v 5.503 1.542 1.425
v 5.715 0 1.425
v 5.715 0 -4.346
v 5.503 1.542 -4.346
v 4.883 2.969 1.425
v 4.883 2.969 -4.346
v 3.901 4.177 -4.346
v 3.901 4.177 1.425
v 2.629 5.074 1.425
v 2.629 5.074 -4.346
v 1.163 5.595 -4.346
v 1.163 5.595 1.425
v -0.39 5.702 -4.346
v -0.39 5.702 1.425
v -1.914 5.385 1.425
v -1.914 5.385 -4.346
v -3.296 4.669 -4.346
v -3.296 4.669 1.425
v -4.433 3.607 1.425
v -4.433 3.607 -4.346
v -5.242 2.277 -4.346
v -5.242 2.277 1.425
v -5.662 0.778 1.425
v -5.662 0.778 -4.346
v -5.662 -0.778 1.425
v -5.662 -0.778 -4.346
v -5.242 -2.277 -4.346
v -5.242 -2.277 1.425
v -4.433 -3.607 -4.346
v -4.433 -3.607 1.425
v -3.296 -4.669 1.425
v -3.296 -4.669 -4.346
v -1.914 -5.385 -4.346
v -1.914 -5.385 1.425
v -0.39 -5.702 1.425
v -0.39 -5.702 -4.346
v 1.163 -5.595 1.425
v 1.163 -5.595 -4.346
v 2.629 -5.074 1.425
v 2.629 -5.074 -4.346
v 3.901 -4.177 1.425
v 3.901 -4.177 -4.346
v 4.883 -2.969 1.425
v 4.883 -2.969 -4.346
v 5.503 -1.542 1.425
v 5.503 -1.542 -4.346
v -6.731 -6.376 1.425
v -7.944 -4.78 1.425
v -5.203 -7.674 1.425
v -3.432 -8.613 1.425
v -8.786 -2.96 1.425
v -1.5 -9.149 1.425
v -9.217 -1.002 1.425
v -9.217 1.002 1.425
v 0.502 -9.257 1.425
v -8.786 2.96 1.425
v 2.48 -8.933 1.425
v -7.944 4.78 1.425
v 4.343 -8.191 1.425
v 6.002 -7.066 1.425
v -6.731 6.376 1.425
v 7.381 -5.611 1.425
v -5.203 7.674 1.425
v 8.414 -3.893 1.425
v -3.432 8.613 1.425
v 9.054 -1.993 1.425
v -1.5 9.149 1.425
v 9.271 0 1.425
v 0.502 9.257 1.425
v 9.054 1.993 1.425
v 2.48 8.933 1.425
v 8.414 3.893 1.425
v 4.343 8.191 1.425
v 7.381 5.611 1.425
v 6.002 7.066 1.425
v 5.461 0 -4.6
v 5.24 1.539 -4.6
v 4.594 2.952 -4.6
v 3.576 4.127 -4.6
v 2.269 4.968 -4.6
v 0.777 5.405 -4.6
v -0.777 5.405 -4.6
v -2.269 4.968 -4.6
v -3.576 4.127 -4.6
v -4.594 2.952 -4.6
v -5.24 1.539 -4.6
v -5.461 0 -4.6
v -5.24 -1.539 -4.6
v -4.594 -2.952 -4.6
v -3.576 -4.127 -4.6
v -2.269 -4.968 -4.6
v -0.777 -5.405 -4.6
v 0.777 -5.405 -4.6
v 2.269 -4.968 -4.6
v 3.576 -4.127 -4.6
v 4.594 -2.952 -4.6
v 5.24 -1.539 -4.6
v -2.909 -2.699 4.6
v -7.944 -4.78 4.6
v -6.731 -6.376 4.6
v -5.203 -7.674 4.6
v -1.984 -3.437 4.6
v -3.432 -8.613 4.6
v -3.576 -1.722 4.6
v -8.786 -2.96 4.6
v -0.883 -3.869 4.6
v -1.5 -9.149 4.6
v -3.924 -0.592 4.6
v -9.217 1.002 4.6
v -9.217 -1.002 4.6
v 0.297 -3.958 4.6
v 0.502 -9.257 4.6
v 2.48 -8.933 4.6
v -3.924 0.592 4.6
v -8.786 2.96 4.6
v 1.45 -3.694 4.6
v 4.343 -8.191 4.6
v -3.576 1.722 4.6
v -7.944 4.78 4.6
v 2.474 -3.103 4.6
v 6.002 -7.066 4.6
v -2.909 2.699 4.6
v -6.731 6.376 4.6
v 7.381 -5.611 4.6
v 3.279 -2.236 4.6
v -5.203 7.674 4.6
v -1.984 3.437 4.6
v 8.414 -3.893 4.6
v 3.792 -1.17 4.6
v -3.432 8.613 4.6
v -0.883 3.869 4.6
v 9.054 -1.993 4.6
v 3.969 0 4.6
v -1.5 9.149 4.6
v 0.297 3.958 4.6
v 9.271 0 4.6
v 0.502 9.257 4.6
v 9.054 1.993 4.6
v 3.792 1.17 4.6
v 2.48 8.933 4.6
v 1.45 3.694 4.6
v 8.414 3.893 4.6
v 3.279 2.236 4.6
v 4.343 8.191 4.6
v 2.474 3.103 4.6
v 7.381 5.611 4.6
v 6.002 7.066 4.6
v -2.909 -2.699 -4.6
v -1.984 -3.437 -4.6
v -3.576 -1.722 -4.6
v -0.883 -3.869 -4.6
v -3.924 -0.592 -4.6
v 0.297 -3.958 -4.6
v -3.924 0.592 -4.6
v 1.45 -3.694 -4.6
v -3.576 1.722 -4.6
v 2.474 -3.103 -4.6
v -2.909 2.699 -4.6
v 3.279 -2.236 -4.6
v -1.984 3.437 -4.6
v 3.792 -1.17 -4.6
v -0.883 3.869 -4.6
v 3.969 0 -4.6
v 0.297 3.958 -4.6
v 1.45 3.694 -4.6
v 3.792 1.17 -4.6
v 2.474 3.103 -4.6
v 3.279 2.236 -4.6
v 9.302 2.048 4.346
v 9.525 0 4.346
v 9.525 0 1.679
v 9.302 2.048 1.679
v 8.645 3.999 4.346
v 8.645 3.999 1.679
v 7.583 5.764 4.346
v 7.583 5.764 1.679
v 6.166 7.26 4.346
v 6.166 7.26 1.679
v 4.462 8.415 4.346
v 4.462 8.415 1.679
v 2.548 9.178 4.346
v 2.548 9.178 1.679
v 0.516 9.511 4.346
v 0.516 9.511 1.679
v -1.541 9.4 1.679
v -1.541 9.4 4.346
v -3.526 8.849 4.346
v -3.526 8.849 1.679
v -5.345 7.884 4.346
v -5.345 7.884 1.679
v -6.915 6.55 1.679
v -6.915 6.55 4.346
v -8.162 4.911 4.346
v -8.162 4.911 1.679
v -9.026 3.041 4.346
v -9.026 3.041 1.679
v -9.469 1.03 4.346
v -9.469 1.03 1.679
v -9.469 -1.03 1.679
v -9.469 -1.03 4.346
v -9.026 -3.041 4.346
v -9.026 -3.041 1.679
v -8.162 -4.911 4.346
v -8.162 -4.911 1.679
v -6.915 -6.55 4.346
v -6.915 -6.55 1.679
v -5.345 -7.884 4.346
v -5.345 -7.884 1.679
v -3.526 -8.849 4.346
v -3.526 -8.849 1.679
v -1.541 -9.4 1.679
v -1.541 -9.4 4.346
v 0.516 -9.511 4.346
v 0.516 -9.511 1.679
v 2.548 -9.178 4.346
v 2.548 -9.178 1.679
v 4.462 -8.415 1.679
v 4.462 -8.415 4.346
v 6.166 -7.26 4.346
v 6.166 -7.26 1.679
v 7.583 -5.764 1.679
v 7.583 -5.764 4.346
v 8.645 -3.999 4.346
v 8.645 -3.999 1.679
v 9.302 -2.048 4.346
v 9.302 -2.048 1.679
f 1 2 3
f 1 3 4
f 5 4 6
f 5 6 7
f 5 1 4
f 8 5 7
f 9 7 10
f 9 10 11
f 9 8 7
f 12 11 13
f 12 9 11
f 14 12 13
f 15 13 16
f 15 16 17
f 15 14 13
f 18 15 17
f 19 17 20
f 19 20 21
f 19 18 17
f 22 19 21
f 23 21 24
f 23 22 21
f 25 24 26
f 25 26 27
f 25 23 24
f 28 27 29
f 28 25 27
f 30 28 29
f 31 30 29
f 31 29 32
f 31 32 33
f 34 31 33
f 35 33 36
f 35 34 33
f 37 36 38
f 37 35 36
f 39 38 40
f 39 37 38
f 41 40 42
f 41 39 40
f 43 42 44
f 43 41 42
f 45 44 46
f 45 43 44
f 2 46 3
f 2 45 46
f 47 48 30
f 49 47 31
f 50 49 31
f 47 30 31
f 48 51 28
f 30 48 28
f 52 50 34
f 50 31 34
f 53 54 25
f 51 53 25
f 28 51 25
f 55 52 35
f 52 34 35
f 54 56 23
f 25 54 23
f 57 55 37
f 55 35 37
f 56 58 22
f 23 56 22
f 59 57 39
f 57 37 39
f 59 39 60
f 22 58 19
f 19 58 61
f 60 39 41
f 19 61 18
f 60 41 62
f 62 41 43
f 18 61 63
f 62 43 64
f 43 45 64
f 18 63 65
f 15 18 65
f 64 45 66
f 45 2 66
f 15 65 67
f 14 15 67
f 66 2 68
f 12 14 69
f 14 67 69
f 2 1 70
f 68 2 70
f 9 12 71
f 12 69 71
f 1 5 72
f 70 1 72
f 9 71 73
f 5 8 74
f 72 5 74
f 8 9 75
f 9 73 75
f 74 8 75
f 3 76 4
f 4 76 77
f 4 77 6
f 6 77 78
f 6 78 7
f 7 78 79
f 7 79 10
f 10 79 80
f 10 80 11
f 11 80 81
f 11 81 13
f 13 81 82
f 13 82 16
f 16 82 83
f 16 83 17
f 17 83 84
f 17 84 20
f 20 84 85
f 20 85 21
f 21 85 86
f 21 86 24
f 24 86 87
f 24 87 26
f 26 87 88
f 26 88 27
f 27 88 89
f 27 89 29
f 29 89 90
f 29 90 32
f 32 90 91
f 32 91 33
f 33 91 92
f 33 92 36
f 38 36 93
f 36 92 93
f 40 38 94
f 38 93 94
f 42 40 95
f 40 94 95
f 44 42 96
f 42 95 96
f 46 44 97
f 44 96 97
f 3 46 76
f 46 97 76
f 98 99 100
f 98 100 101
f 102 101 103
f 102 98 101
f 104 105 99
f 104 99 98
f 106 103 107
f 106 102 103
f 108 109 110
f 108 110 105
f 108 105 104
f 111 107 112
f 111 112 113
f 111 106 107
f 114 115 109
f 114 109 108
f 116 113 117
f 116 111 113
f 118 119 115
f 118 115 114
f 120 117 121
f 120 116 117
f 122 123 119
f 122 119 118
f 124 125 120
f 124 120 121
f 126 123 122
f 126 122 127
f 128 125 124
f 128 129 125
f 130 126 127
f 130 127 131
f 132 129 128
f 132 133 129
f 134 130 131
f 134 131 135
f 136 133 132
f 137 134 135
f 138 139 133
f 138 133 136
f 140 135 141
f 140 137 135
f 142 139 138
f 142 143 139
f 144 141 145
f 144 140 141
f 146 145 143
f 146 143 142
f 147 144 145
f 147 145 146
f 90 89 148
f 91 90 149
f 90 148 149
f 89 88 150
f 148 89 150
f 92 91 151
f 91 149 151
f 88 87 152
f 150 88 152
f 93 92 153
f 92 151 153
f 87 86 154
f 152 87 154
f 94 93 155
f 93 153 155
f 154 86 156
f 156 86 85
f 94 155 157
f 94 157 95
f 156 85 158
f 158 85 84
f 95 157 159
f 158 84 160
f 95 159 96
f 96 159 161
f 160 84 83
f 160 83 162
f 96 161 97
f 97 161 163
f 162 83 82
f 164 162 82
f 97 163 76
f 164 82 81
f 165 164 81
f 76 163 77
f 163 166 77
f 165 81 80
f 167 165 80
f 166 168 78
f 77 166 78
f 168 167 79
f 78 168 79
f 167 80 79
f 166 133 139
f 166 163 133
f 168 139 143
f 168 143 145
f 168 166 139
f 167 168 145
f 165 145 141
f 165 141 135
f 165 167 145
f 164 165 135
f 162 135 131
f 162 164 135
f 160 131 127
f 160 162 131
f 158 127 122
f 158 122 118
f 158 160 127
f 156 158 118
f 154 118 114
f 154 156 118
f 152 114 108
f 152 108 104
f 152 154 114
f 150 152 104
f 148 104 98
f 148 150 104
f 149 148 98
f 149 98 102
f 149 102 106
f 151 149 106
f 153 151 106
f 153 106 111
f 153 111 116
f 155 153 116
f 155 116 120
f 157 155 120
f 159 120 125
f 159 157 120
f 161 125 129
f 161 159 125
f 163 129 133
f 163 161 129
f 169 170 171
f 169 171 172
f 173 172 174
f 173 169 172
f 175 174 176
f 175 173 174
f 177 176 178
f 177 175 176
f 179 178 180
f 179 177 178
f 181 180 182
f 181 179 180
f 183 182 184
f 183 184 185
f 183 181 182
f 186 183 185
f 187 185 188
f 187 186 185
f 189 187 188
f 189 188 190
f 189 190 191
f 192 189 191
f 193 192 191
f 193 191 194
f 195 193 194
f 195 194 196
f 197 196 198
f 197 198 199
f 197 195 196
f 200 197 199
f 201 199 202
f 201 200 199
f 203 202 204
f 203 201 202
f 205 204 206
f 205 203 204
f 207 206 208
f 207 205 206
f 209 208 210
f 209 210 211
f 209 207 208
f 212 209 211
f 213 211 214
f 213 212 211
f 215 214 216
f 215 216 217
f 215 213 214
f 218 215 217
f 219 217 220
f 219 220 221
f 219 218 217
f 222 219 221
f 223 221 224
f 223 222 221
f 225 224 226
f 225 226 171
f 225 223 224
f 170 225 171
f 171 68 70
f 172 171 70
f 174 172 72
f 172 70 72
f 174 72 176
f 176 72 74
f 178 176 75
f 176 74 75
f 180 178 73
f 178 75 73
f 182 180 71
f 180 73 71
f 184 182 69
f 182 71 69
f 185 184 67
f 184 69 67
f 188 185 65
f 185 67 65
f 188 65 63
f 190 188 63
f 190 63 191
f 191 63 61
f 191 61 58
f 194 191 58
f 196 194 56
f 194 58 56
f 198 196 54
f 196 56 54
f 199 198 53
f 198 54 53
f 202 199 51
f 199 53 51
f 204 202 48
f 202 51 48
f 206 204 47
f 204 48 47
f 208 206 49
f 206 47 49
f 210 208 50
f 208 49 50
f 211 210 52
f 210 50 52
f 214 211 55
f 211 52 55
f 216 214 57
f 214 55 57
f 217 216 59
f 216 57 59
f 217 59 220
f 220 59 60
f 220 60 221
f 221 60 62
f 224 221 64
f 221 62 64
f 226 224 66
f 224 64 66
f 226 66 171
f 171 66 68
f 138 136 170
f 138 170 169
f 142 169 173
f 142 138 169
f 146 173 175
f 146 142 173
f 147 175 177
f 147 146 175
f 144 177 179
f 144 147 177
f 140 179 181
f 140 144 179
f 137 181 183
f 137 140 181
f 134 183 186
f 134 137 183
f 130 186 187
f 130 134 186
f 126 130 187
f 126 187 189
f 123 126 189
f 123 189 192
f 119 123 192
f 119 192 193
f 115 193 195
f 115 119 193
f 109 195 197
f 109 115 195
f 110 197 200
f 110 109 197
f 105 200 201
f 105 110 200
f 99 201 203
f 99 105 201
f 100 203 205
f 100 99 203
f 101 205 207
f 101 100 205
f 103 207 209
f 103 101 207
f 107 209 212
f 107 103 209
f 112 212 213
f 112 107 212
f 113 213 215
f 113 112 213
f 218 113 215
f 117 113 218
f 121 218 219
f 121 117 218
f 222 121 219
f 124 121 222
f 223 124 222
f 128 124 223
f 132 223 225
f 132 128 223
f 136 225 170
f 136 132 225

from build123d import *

# Parameters (mm, degrees)
SKETCH1_R           = 5.715
SKETCH1_R_2         = 3.96875
BOSS_EXTRUDE1_DEPTH = 4.6
SKETCH2_R           = 9.525
SKETCH2_R_2         = 5.715
BOSS_EXTRUDE2_DEPTH = 3.175
CHAMFER2_SIZE       = 0.254


with BuildPart() as part:
    # Sketch1 → Boss-Extrude1 (new body, symmetric)
    with BuildSketch(Plane.XY):
        Circle(SKETCH1_R)
        Circle(SKETCH1_R_2, mode=Mode.SUBTRACT)
    extrude(amount=BOSS_EXTRUDE1_DEPTH, both=True)

    # Sketch2 → Boss-Extrude2 (add)
    with BuildSketch(Plane.XY.offset(4.6)):
        Circle(SKETCH2_R)
        Circle(SKETCH2_R_2, mode=Mode.SUBTRACT)
    extrude(amount=-BOSS_EXTRUDE2_DEPTH)

    # Chamfer2
    chamfer2_edges = [part.edges().sort_by_distance(p)[0] for p in [
        (-9.525, 0, 1.425),
        (-9.525, 0, 4.6),
        (-5.715, 0, -4.6),
    ]]
    chamfer(chamfer2_edges, length=CHAMFER2_SIZE)


solid = part.part
